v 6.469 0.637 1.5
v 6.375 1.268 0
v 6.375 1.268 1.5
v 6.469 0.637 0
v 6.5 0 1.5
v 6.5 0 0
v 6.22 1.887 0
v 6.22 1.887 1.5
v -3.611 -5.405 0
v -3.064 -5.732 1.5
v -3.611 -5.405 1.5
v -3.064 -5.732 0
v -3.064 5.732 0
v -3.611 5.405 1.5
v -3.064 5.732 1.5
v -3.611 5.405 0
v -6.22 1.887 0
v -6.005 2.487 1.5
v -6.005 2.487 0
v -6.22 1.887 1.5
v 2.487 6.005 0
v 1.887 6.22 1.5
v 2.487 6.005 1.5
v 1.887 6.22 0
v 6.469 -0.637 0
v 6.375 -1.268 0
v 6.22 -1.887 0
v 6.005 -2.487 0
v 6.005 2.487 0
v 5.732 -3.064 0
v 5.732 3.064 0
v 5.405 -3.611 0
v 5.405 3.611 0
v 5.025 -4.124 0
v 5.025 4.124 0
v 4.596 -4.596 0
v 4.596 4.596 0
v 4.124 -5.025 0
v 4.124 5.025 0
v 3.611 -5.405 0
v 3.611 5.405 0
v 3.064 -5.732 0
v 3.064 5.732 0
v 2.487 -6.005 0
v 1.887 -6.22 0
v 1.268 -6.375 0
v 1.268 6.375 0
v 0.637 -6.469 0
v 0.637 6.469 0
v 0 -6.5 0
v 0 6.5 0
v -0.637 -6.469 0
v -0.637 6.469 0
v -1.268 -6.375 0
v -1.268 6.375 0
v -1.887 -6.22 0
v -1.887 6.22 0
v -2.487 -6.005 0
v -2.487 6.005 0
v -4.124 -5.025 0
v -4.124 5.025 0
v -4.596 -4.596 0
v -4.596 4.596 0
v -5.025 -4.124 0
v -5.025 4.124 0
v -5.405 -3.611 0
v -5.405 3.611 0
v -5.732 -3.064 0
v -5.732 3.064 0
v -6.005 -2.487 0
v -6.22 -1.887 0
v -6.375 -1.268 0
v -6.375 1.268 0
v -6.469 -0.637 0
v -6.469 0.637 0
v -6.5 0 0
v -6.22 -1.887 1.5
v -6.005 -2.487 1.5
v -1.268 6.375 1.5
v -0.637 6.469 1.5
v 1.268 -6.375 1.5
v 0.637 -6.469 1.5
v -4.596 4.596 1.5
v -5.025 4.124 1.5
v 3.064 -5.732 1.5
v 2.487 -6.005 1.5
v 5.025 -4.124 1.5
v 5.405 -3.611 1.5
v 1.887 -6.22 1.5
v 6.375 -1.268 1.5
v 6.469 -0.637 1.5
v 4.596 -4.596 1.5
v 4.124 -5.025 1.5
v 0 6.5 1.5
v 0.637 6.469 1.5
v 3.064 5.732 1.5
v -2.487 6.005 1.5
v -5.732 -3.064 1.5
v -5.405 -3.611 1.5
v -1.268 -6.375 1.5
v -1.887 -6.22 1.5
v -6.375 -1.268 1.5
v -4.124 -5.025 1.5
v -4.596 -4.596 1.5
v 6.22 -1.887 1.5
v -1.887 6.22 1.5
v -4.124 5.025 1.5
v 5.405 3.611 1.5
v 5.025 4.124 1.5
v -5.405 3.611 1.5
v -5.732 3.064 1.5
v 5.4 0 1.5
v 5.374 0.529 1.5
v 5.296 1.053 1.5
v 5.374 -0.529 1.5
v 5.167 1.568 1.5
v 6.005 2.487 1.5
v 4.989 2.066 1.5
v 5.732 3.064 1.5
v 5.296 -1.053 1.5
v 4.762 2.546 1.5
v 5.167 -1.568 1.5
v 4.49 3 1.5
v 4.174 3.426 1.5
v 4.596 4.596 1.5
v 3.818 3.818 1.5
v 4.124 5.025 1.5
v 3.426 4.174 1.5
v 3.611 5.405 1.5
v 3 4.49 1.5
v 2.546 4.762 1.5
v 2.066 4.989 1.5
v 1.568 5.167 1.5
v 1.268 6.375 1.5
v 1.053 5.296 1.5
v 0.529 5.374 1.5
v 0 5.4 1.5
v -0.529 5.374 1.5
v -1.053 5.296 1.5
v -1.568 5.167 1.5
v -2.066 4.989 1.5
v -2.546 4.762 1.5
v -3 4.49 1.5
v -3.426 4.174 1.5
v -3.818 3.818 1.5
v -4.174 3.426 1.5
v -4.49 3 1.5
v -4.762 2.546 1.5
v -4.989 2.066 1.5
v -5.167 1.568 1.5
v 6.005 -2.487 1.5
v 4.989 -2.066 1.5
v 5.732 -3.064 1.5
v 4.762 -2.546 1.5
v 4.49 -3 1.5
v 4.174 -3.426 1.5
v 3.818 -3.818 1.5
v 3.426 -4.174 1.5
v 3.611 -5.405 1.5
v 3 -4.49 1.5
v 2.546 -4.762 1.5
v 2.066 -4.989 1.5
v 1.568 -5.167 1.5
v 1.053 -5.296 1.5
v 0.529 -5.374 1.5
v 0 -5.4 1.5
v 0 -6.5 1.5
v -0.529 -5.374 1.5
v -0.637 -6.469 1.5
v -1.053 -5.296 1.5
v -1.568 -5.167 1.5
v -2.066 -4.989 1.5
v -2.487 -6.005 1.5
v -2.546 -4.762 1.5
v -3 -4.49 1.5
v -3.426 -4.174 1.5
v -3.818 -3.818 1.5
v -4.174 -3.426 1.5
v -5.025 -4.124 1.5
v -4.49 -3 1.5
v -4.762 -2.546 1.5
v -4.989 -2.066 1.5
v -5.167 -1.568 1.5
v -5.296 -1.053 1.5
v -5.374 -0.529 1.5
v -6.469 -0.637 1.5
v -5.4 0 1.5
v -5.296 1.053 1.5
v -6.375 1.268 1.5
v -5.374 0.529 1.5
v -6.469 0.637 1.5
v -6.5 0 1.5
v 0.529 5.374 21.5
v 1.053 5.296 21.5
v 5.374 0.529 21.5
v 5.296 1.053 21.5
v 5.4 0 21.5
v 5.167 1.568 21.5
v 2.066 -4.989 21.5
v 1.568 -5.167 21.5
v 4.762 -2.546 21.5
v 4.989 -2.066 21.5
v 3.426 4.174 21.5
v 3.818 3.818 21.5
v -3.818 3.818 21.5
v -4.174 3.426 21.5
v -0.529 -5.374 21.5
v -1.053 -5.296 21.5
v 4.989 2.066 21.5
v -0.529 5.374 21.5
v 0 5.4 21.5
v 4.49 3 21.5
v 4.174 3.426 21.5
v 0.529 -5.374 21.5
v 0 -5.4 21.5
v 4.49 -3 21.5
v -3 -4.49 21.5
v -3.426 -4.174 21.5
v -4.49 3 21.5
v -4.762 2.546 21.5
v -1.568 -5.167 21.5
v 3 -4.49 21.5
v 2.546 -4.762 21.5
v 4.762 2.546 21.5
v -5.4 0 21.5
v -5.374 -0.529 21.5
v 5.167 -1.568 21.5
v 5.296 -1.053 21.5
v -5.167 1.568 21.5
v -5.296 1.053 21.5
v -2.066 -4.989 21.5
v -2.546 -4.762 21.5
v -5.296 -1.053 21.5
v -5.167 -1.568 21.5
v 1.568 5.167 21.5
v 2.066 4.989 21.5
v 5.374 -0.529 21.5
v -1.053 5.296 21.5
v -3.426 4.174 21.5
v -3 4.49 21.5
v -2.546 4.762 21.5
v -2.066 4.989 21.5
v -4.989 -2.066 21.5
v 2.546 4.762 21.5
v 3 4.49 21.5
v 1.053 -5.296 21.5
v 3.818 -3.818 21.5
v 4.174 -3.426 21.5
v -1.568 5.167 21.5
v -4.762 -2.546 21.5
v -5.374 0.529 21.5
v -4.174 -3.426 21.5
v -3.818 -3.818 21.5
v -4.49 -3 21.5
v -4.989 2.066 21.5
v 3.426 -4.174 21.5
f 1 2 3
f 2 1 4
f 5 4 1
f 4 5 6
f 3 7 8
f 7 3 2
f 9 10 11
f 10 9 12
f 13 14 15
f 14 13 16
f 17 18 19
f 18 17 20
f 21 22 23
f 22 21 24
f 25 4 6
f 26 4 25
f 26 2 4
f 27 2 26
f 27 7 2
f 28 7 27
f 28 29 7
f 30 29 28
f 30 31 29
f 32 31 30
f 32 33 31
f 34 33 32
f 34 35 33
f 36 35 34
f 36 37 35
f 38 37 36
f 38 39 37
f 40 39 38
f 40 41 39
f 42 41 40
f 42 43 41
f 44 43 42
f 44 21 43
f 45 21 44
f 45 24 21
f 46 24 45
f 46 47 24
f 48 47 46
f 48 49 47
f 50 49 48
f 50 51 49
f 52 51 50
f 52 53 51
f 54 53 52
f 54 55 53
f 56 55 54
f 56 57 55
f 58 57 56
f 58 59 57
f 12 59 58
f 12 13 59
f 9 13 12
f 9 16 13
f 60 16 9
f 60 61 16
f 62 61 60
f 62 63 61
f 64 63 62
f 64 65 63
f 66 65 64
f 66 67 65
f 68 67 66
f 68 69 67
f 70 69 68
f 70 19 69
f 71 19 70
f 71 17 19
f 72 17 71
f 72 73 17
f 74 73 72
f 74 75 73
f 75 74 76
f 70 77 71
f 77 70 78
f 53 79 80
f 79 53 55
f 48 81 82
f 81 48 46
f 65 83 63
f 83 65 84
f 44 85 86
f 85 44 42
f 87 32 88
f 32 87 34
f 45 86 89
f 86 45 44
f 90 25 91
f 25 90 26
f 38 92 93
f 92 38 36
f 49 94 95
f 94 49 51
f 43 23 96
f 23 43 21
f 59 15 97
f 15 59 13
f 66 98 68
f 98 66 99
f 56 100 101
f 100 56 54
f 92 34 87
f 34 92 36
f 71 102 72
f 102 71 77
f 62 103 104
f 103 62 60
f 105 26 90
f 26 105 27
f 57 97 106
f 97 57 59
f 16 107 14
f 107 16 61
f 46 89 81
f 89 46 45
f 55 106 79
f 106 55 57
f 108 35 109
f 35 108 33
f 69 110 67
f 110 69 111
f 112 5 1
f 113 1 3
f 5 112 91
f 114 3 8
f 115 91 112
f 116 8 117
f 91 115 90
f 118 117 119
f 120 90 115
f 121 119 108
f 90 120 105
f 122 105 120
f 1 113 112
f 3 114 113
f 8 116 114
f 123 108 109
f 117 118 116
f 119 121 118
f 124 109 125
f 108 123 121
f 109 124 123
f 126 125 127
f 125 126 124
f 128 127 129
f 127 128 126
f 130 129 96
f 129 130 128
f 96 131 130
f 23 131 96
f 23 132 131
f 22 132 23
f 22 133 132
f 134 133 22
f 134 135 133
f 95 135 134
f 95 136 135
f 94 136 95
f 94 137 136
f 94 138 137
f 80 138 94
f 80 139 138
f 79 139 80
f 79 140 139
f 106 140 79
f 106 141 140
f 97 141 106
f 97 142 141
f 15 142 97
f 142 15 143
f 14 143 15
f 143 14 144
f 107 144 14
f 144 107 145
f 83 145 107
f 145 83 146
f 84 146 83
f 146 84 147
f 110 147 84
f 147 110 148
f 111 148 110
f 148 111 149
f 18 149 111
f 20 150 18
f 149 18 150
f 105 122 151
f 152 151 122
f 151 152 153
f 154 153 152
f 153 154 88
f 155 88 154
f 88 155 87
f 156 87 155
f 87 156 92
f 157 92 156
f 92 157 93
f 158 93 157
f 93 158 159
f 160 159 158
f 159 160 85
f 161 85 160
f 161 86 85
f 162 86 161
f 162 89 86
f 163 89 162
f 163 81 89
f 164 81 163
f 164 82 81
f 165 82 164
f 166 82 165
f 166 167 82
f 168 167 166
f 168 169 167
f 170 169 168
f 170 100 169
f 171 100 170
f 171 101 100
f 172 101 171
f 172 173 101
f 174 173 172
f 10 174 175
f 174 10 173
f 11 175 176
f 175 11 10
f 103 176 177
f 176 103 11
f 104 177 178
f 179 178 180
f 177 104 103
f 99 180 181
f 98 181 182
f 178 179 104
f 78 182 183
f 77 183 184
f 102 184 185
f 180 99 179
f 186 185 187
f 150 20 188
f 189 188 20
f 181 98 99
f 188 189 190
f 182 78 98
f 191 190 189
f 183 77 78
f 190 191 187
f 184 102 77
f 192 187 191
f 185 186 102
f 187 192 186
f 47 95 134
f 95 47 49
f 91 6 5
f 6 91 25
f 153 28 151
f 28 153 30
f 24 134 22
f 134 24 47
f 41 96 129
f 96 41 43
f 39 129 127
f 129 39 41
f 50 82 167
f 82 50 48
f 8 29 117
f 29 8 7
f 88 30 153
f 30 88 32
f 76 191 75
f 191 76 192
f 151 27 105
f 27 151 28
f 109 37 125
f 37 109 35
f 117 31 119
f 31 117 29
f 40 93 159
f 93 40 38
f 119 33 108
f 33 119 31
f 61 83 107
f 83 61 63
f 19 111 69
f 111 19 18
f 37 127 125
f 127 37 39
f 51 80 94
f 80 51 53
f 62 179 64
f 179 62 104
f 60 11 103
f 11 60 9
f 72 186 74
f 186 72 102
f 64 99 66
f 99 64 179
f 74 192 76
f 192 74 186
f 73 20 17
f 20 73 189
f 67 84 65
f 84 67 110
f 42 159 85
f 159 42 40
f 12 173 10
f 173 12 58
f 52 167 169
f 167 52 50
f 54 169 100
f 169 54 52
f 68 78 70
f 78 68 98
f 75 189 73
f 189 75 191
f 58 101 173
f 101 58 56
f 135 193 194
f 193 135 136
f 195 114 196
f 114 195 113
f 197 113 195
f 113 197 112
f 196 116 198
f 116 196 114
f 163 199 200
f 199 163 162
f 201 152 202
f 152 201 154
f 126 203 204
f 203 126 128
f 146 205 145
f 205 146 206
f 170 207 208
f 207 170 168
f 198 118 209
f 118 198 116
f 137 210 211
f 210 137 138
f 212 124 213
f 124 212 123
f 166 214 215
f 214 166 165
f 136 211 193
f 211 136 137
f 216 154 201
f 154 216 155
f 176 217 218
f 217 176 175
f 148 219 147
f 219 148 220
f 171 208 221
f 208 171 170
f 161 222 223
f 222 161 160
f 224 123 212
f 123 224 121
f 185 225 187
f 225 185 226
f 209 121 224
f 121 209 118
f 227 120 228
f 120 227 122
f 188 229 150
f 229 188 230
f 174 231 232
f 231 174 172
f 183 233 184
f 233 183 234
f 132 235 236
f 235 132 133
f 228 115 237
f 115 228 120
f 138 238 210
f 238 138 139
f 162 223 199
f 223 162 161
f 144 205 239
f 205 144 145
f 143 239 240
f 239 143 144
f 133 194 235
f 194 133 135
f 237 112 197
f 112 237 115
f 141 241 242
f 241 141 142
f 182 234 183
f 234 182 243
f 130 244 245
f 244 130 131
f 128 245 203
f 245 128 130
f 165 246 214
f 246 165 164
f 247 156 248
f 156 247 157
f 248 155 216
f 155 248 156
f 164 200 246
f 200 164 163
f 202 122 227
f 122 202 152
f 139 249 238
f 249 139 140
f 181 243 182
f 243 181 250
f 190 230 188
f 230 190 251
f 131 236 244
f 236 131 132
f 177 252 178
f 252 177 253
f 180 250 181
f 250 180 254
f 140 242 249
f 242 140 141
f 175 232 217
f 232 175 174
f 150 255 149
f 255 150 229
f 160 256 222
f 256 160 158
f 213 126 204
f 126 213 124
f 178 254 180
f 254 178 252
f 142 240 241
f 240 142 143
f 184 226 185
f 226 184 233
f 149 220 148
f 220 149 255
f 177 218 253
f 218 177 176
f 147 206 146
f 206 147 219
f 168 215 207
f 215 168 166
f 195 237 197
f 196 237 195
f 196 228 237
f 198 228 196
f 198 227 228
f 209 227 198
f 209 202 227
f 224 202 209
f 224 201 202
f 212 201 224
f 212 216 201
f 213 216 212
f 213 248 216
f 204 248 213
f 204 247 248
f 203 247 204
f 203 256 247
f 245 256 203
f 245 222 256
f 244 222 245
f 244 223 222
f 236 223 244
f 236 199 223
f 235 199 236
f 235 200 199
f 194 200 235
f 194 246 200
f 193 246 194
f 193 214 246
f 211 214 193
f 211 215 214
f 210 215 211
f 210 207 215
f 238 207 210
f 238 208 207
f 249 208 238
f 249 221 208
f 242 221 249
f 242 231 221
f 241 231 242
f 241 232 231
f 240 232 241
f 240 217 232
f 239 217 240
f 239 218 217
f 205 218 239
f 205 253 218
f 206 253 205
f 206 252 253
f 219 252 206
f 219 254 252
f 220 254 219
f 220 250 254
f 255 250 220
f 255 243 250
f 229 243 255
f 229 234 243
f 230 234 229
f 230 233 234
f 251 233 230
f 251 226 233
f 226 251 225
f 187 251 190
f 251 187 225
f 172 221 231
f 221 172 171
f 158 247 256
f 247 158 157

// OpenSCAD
// Dimensions
COLLAR_OD = 13;       // Outer diameter of the base collar
COLLAR_THICK = 1.5;   // Thickness of the base collar
SLEEVE_OD = 10.8;     // Outer diameter of the sleeve body
SLEEVE_H = 21.5;      // Total height of the sleeve (from z=0)
BORE_D = 6.2;         // Inner bore diameter

// Calculated dimensions
COLLAR_R = COLLAR_OD / 2;
SLEEVE_R = SLEEVE_OD / 2;
BORE_R = BORE_D / 2;
SLEEVE_BODY_H = SLEEVE_H - COLLAR_THICK;

// Print orientation: Collar on bed (z=0 to 1.5), sleeve rises to z=21.5
// Centered on XY origin.

module adapter_sleeve() {
    // 1. The base collar (rests on the bed)
    // Extends slightly below z=0 to ensure a solid bottom face when printed upside down
    // or just to be safe with the slicer. However, the prompt says it lies on the bed z=0 to 1.5.
    // We will model it exactly as described.
    cylinder(r = COLLAR_R, h = COLLAR_THICK, center = false);

    // 2. The sleeve body
    // Rises from the top of the collar (z = 1.5) to z = 21.5
    // Height of the body part = 21.5 - 1.5 = 20.0
    translate([0, 0, COLLAR_THICK]) {
        cylinder(r = SLEEVE_R, h = SLEEVE_BODY_H, center = false);
    }

    // 3. The bore
    // Runs through the full height (z=0 to z=21.5).
    // To ensure clean holes at both ends, we extend the cutting cylinder slightly past the faces.
    // Open at both ends: z=0 and z=21.5.
    // We subtract a cylinder that extends from -0.05 to 21.55.
    $fn = 64;
    difference() {
        // The solid body (union of collar and sleeve body)
        union() {
            cylinder(r = COLLAR_R, h = COLLAR_THICK, center = false);
            translate([0, 0, COLLAR_THICK]) {
                cylinder(r = SLEEVE_R, h = SLEEVE_BODY_H, center = false);
            }
        }
        
        // The cutting bore
        // Extends past z=0 by 0.05 and past z=21.5 by 0.05
        translate([0, 0, -0.05]) {
            cylinder(r = BORE_R, h = SLEEVE_H + 0.1, center = false);
        }
    }
}

adapter_sleeve();
